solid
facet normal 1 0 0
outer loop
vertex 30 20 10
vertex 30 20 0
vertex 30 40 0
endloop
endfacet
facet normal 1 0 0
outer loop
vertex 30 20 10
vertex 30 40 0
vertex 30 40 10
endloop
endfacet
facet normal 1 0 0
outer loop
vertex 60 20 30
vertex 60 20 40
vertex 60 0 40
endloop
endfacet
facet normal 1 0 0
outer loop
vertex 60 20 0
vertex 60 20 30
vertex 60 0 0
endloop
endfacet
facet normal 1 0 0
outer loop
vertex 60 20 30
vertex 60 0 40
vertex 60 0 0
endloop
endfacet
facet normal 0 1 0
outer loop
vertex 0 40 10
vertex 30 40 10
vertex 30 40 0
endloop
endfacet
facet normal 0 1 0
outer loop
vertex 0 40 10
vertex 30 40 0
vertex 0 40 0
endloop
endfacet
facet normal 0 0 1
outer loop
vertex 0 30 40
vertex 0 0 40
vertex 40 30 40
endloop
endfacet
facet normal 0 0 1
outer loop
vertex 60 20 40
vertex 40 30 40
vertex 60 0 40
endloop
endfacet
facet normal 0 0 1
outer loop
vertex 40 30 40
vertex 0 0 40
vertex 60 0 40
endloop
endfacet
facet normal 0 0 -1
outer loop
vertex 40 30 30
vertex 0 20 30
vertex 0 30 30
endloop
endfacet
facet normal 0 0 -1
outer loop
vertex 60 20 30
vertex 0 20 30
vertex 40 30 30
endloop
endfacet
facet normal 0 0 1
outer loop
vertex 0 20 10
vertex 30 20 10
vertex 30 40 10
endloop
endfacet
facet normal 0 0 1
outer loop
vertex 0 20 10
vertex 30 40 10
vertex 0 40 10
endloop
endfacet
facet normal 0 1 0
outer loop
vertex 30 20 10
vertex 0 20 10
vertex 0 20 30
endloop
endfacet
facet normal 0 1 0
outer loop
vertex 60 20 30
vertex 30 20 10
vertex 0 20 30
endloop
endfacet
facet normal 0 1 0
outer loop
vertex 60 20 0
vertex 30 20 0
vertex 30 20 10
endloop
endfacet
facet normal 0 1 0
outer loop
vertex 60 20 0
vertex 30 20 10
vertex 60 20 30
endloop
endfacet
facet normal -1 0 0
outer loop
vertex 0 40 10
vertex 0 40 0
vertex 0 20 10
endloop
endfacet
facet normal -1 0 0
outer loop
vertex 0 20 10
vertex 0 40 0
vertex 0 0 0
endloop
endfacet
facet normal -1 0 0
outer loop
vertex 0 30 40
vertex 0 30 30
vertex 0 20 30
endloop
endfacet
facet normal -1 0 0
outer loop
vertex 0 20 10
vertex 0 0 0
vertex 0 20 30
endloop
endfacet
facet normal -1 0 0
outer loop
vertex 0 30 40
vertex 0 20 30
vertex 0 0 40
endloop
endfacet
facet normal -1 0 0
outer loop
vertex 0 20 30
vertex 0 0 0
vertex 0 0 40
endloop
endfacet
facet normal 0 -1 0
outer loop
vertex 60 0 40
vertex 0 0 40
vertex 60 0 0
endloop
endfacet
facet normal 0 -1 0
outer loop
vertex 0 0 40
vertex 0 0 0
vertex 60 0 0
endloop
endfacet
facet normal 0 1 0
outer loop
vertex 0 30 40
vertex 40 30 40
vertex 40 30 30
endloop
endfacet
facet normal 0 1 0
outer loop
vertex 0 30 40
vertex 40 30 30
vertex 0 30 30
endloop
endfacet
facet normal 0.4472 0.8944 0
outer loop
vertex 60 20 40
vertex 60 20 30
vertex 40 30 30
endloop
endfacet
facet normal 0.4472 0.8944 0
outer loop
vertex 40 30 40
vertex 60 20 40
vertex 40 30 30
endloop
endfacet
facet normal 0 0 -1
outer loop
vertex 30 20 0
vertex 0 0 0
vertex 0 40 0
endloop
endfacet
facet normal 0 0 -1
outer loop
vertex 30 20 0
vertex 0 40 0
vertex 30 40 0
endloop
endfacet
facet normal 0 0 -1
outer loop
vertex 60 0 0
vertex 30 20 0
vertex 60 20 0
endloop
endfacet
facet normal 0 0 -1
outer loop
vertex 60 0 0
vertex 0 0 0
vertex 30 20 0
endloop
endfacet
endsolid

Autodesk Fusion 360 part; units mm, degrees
sketch "Sketch1" plane through (0, 0, 0) normal (0, 1, 0) x (1, 0, 0)
  line L0 (0, 0) -> (60, 0)
  line L1 (60, 0) -> (60, -40)
  line L2 (60, -40) -> (0, -40)
  line L3 (0, -40) -> (0, 0)
  dimension "d1" = 60
  dimension "d2" = 40
extrude "Extrude1" add sketch "Sketch1" along normal blind 20
sketch "Sketch2" plane through (0, 20, 0) normal (0, 1, 0) x (-1, 0, 0)
  line L0 (0, 40) -> (-60, 40)
  line L1 (-60, 40) -> (-60, 0)
  line L2 (-60, 0) -> (0, 0)
  line L3 (0, 0) -> (0, 40)
  line L4 (0, 0) -> (-30, 0)
  line L5 (-30, 0) -> (-30, 10)
  line L6 (-30, 10) -> (0, 10)
  line L7 (0, 10) -> (0, 0)
  dimension "d5" = 30
  dimension "d6" = 10
extrude "Extrude2" add sketch "Sketch2" along normal blind 20 contours L2 L3 L4 L5 L6 L7
sketch "Sketch3" plane through (0, 20, 0) normal (0, 1, 0) x (-1, 0, 0)
  line L0 (-30, 0) -> (-30, 10)
  line L1 (-30, 10) -> (0, 10)
  line L2 (0, 10) -> (0, 40)
  line L3 (0, 40) -> (-60, 40)
  line L4 (-60, 40) -> (-60, 0)
  line L5 (-60, 0) -> (-30, 0)
  line L6 (0, 30) -> (-60, 30)
  line L7 (-60, 30) -> (-60, 40)
  line L8 (-60, 40) -> (0, 40)
  line L9 (0, 40) -> (0, 30)
  dimension "d9" = 10
extrude "Extrude3" add sketch "Sketch3" along normal blind 10 contours L2 L3 L4 L6 L7 L8 L9
sketch "Sketch4" plane through (0, 0, 30) normal (0, 0, -1) x (-1, 0, 0)
  line L0 (-60, 20) -> (0, 20)
  line L1 (0, 20) -> (0, 30)
  line L2 (0, 30) -> (-60, 30)
  line L3 (-60, 30) -> (-60, 20)
  line L4 (-60, 20) -> (-40, 30)
  line L5 (-60, 20) -> (-60, 30)
  line L6 (-40, 30) -> (-60, 30)
  dimension "d12" = 20
extrude "Extrude4" cut sketch "Sketch4" against normal blind 10 contours L2 L3 L4 L5 L6
